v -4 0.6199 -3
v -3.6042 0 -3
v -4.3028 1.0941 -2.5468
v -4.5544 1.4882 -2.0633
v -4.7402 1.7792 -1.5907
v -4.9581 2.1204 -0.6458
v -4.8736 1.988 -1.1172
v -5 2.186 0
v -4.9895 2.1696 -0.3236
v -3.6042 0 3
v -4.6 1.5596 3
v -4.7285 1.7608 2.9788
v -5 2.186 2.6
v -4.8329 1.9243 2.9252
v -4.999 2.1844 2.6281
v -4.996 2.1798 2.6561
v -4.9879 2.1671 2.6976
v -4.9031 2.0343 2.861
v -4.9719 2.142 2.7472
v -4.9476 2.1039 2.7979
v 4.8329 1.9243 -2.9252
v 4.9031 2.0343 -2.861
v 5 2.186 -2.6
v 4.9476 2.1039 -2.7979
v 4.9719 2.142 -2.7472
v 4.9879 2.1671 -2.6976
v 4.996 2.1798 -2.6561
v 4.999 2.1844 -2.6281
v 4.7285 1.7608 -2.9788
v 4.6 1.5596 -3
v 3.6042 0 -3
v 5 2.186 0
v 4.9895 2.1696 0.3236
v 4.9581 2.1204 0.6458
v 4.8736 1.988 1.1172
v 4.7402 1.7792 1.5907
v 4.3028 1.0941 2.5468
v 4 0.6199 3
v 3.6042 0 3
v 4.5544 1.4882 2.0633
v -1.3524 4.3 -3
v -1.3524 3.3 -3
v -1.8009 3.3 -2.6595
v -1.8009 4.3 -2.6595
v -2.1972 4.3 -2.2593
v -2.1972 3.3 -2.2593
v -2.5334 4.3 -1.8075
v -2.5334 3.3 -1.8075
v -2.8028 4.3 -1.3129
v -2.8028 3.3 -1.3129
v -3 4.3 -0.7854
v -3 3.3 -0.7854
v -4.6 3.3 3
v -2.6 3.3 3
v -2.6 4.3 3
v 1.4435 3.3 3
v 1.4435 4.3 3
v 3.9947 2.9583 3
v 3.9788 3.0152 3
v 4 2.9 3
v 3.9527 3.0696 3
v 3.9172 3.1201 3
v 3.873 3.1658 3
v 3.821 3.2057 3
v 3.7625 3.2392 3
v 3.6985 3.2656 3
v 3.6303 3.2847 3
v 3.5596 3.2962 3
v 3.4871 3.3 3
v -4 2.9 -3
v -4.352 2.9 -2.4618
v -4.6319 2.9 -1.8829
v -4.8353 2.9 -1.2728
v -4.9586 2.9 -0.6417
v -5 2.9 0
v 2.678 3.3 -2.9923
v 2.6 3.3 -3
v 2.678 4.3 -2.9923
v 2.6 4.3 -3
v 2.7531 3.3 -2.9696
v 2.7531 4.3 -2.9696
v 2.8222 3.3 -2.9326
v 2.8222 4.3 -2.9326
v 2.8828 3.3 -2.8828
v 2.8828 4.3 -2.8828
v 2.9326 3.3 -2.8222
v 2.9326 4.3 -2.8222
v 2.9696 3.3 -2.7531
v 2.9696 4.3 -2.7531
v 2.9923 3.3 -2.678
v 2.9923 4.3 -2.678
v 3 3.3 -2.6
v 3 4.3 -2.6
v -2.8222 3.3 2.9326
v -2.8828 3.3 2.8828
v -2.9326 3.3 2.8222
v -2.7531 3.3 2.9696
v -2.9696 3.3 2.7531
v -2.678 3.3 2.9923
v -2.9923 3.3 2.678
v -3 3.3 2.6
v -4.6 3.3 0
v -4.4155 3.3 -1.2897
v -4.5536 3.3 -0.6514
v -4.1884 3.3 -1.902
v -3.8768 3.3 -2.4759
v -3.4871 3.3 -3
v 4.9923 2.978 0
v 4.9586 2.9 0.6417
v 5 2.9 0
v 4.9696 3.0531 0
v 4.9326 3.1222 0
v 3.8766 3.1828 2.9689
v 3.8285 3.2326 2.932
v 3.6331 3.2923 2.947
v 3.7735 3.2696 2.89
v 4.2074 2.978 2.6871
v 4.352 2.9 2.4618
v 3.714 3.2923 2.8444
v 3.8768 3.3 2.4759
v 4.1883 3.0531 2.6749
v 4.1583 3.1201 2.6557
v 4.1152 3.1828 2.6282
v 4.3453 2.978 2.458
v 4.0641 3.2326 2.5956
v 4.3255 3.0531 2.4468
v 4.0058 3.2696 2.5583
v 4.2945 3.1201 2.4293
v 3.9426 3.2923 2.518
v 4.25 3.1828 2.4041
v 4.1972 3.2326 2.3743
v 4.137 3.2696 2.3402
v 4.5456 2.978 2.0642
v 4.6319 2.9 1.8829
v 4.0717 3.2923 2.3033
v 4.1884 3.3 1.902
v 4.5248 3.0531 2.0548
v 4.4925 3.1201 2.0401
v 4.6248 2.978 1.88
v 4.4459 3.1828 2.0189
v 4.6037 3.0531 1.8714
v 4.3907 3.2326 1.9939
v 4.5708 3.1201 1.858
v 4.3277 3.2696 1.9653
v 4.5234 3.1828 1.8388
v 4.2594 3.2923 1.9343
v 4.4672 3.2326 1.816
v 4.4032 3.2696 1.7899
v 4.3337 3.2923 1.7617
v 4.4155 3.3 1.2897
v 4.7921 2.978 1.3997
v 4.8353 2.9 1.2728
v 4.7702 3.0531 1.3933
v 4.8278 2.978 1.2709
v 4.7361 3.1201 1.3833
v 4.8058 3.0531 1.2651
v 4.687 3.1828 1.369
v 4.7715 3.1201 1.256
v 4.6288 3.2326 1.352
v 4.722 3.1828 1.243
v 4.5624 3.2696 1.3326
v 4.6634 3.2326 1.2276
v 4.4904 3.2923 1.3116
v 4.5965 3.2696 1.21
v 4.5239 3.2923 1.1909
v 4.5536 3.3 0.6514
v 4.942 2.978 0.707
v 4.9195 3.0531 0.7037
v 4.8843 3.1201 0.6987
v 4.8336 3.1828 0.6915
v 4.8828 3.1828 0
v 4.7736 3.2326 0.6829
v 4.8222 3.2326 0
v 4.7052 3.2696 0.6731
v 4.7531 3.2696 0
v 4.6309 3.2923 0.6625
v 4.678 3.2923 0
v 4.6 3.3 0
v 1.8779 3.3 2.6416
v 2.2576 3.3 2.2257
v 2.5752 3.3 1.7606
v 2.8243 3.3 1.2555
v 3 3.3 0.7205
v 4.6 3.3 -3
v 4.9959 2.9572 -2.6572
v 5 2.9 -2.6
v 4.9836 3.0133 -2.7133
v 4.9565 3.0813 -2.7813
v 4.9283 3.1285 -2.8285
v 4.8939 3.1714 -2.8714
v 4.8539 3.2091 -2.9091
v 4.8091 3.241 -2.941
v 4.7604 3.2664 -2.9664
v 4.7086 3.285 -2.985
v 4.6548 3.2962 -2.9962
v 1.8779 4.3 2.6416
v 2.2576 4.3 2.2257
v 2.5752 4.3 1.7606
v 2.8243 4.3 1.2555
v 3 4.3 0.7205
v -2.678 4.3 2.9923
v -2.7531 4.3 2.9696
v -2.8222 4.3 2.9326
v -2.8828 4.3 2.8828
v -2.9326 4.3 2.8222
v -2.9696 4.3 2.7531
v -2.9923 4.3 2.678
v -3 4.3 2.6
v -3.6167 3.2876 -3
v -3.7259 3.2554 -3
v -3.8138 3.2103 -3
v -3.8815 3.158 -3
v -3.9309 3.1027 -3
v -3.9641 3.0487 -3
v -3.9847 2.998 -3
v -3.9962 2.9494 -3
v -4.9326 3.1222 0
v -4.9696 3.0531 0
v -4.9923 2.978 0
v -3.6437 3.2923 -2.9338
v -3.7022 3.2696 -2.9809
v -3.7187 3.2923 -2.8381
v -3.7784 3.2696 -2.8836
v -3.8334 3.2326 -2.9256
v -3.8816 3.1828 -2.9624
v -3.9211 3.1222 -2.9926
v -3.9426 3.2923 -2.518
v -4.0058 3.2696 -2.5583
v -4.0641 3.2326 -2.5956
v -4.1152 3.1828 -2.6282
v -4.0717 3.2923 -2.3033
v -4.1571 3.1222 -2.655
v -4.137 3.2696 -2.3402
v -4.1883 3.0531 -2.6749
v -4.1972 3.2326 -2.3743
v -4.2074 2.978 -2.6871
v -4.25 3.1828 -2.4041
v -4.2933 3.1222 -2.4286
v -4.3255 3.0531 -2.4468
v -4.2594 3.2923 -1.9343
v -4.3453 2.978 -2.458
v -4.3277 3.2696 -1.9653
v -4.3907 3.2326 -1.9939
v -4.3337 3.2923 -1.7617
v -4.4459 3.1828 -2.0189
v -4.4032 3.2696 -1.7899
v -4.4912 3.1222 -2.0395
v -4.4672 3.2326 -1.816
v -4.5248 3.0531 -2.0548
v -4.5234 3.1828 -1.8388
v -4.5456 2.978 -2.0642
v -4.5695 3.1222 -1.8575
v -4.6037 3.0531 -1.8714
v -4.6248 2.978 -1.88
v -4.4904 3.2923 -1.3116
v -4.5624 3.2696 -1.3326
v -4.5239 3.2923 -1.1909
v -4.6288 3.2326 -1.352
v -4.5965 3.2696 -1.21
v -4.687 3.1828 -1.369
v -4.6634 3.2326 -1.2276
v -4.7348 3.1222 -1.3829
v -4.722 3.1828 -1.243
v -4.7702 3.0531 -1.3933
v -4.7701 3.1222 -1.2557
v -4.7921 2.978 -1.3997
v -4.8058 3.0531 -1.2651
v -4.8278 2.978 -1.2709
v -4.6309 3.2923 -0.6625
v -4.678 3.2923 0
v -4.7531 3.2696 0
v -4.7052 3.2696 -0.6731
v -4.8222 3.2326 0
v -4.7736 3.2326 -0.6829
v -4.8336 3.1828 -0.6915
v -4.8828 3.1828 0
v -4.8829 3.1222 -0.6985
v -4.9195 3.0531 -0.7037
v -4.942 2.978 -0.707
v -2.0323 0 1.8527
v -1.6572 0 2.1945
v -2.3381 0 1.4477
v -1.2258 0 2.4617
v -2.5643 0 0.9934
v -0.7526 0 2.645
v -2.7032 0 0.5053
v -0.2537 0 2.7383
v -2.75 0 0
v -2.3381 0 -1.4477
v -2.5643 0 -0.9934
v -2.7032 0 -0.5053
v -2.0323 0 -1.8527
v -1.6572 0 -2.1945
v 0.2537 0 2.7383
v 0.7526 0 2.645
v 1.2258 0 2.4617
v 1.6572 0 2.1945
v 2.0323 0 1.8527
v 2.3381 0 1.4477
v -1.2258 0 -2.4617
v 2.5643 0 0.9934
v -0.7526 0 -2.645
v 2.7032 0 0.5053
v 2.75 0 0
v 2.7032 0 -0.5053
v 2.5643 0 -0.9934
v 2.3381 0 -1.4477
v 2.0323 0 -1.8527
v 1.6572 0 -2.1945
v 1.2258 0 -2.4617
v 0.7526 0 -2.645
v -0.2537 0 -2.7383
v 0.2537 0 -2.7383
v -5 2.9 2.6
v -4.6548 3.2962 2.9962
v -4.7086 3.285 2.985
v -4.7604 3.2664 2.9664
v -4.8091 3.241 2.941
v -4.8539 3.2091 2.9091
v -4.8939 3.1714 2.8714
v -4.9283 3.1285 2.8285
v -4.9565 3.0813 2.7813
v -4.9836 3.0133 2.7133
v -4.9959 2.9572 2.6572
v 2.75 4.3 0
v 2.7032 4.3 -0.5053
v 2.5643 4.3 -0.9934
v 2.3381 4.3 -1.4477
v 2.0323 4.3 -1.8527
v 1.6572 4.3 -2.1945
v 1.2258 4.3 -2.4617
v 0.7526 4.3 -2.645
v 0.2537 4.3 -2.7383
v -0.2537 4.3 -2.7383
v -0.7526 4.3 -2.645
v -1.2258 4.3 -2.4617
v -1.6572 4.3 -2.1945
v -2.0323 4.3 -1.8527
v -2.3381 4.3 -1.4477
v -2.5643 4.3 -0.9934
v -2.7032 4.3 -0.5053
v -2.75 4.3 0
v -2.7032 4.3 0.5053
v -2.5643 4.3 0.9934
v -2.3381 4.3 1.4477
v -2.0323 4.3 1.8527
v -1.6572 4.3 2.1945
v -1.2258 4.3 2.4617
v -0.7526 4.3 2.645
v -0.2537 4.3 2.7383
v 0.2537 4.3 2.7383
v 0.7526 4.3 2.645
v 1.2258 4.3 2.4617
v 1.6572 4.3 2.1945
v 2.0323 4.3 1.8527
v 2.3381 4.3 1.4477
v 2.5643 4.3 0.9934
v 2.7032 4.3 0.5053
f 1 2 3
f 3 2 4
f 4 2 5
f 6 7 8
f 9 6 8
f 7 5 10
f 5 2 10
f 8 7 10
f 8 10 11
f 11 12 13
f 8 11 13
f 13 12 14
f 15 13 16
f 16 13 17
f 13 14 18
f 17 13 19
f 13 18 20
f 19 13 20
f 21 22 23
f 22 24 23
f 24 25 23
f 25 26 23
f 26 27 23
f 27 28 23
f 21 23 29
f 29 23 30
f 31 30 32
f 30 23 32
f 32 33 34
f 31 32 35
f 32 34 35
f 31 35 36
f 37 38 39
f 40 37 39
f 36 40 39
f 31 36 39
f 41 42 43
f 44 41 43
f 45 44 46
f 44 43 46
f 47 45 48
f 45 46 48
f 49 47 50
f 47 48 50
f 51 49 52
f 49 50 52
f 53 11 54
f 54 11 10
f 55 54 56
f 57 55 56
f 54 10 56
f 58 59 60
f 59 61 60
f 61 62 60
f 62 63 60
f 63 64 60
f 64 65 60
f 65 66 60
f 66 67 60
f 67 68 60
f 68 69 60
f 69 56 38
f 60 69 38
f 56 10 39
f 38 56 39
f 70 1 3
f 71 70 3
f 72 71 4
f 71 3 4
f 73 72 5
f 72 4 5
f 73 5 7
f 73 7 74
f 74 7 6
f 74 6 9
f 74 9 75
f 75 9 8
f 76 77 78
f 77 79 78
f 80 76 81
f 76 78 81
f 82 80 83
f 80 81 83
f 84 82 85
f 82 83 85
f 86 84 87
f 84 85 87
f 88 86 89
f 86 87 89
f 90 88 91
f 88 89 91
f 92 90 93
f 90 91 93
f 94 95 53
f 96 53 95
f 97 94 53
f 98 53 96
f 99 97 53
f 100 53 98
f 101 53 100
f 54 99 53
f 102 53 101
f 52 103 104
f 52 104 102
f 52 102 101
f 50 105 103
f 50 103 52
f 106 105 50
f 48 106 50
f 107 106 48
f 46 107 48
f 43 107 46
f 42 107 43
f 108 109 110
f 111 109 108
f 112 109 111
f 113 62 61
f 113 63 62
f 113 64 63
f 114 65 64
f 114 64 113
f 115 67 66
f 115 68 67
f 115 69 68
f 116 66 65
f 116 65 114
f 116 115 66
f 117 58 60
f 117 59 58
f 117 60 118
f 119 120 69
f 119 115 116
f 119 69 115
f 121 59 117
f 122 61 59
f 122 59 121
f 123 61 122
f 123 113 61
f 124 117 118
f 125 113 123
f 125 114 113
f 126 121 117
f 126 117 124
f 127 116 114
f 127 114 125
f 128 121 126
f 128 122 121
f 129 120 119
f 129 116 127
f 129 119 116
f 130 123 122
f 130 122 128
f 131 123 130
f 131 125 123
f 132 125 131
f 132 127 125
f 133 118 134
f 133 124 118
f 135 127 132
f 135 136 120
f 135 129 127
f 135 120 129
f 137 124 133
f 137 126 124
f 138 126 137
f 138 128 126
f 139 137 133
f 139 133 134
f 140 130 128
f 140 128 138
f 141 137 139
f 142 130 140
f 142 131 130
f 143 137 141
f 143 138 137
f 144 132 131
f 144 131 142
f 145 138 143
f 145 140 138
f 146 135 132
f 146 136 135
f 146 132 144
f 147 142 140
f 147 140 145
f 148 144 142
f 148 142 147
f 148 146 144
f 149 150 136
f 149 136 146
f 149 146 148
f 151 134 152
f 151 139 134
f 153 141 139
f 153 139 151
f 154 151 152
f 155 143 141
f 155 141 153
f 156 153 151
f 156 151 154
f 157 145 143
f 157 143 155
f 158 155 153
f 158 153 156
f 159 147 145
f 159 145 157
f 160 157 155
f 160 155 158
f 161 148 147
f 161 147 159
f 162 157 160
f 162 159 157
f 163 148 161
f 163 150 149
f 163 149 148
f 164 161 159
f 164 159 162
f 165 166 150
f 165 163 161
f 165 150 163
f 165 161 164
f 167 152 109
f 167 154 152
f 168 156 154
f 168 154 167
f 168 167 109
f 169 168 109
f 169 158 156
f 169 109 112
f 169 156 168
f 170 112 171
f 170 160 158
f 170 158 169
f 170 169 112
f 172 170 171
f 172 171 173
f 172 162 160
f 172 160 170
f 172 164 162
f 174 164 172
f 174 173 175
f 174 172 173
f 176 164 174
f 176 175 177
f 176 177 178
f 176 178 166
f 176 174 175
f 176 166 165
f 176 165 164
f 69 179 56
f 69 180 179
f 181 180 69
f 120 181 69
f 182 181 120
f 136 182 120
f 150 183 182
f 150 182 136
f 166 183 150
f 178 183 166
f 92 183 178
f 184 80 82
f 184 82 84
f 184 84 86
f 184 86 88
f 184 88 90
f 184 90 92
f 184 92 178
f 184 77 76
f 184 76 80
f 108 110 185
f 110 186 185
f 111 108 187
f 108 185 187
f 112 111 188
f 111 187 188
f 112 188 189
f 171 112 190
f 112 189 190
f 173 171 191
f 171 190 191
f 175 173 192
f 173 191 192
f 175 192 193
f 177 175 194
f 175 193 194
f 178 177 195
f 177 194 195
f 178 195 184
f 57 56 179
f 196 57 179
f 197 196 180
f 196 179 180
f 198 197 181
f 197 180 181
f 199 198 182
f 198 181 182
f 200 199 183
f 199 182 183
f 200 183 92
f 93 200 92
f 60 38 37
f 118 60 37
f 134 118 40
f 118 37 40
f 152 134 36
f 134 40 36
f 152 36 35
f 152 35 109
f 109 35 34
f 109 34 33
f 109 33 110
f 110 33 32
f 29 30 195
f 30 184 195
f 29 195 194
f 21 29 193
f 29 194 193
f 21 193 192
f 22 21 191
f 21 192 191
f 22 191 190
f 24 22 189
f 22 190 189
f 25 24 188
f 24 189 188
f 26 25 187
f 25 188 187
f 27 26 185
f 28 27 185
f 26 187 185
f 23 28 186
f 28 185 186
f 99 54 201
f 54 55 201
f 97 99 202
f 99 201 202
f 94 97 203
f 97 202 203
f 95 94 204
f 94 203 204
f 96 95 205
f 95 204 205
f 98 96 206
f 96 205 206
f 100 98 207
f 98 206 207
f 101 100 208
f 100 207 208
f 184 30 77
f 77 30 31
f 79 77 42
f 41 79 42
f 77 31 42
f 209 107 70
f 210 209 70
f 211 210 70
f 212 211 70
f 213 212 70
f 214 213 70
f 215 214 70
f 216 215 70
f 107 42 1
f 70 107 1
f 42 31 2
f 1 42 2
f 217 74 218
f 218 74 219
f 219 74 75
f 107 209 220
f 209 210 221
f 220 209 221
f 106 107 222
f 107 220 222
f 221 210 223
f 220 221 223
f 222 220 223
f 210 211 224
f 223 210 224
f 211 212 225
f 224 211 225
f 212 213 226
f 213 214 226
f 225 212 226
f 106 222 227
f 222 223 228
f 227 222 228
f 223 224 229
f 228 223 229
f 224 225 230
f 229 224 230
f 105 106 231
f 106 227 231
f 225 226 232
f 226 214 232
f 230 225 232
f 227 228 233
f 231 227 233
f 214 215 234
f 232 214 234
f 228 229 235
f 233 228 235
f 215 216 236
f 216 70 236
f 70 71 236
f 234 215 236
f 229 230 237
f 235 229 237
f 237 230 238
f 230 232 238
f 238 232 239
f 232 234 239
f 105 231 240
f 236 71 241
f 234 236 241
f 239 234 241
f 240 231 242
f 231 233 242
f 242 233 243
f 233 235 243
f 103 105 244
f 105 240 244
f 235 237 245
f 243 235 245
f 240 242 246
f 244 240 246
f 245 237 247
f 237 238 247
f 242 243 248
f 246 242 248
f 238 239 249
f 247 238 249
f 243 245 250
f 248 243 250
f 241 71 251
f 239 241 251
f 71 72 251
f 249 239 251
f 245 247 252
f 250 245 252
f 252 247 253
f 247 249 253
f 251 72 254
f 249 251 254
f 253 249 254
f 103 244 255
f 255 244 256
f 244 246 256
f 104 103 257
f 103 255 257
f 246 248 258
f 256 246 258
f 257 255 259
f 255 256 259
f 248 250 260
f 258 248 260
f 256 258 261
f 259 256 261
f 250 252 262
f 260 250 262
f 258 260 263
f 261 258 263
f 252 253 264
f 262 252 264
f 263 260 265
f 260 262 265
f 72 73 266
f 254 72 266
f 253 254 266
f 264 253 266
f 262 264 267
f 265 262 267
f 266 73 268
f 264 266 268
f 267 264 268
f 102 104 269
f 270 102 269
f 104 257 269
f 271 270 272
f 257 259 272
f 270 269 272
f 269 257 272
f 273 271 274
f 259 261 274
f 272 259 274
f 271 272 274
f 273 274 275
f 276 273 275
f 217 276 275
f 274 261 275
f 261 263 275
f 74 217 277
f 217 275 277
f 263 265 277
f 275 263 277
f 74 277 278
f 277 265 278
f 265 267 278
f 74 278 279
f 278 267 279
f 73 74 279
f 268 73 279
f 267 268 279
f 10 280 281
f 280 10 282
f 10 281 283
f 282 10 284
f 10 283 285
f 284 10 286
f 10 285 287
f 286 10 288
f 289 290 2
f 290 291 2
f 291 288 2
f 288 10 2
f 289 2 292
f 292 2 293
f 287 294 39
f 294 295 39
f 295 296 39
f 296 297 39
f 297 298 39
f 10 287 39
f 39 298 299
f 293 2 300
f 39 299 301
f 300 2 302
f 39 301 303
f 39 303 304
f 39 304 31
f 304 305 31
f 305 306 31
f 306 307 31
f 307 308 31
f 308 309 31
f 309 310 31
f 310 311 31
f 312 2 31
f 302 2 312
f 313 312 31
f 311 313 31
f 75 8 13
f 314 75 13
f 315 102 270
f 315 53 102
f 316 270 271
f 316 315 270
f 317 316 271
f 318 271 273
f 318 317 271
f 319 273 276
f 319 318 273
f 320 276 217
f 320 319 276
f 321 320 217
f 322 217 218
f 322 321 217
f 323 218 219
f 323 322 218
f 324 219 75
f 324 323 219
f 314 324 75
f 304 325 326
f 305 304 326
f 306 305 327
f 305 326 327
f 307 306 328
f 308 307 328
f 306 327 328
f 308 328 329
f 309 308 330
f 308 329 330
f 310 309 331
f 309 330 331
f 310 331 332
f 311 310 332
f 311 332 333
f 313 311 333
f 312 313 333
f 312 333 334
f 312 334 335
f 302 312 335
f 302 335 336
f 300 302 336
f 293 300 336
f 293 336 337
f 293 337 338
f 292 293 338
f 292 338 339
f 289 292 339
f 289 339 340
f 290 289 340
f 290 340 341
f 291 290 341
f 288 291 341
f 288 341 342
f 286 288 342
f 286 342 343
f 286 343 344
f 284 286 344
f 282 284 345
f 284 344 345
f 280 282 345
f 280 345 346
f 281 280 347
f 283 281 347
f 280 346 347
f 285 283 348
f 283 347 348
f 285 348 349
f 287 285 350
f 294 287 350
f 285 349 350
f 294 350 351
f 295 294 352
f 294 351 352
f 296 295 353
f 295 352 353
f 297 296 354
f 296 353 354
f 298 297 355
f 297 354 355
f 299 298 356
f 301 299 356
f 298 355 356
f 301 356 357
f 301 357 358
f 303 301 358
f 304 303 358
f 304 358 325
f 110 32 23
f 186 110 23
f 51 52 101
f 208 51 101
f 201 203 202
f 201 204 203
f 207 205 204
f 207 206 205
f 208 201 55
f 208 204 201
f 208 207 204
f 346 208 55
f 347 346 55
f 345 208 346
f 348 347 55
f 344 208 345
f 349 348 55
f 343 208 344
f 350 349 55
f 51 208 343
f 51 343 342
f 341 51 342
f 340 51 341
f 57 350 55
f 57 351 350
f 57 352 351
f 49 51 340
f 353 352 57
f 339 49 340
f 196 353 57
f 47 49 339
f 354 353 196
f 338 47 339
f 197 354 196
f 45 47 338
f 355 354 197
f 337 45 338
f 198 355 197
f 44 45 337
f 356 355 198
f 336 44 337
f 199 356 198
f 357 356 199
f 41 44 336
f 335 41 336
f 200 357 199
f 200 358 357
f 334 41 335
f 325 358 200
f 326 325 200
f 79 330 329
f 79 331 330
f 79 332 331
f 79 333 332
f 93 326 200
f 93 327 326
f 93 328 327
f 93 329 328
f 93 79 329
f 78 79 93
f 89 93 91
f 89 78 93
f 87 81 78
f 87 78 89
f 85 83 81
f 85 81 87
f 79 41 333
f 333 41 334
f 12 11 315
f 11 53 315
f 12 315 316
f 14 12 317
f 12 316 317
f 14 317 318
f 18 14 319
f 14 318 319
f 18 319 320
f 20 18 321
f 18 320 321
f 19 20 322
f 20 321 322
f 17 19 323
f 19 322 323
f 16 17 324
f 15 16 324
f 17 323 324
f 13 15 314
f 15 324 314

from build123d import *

# Parameters (mm, degrees)
BOSS_EXTRUDE1_DEPTH = 3.3
BOSS_EXTRUDE2_DEPTH = 1
SKETCH4_R           = 2.75
CUT_EXTRUDE1_DEPTH  = 5.3
CUT_EXTRUDE2_DEPTH  = 7
FILLET1_R           = 0.4


with BuildPart() as part:
    # Sketch1 → Boss-Extrude1 (new body)
    with BuildSketch(Plane(origin=(0, 0, 0), x_dir=(1, 0, 0), z_dir=(0, 1, 0))):
        with BuildLine():
            Line((-5, -3), (4, -3))
            ThreePointArc((4, -3), (4.74341641, -1.581139071), (5, -5.07e-07))
            Line((5, -5.07e-07), (5, 3))
            Line((5, 3), (-4, 3))
            ThreePointArc((-4, 3), (-4.74341641, 1.581139071), (-5, 5.07e-07))
            Line((-5, 5.07e-07), (-5, -3))
        make_face()
    extrude(amount=BOSS_EXTRUDE1_DEPTH)

    # Sketch3 → Boss-Extrude2 (add)
    with BuildSketch(Plane(origin=(0, 3.3, 0), x_dir=(1, 0, 0), z_dir=(0, 1, 0))):
        with BuildLine():
            Line((-3, -3), (1.443496021, -3))
            ThreePointArc((1.443496021, -3), (2.424601601, -1.998754321), (3, -0.720482929))
            Line((3, -0.720482929), (3, 3))
            Line((3, 3), (-1.352396976, 3))
            ThreePointArc((-1.352396976, 3), (-2.373272189, 2.039336237), (-3, 0.785433003))
            Line((-3, 0.785433003), (-3, -3))
        make_face()
    extrude(amount=BOSS_EXTRUDE2_DEPTH)

    # Sketch4 → Cut-Extrude1 (cut, through all)
    with BuildSketch(Plane(origin=(0, 4.3, 0), x_dir=(1, 0, 0), z_dir=(0, 1, 0))):
        Circle(SKETCH4_R)
    extrude(amount=-CUT_EXTRUDE1_DEPTH, mode=Mode.SUBTRACT)

    # Sketch5 → Cut-Extrude2 (cut, through all)
    with BuildSketch(Plane.XY.offset(3)):
        Polygon((4, 0), (5, 0), (5, 2.185994227), (3.604159787, 0), align=None)
        Polygon((-5, 0), (-3.604159787, 0), (-5, 2.185994227), align=None)
    extrude(amount=-CUT_EXTRUDE2_DEPTH, mode=Mode.SUBTRACT)

    # Fillet1
    fillet1_edges = [part.edges().sort_by_distance(p)[0] for p in [
        (-5, 2.742997113, 3),
        (5, 2.742997113, -3),
        (-4.74341641, 3.3, -1.581139071),
        (-5, 3.3, 1.499999746),
        (3, 3.8, -3),
        (4.74341641, 3.3, 1.581139071),
        (-3, 3.8, 3),
        (5, 3.3, -1.499999746),
    ]]
    fillet(fillet1_edges, radius=FILLET1_R)


solid = part.part
